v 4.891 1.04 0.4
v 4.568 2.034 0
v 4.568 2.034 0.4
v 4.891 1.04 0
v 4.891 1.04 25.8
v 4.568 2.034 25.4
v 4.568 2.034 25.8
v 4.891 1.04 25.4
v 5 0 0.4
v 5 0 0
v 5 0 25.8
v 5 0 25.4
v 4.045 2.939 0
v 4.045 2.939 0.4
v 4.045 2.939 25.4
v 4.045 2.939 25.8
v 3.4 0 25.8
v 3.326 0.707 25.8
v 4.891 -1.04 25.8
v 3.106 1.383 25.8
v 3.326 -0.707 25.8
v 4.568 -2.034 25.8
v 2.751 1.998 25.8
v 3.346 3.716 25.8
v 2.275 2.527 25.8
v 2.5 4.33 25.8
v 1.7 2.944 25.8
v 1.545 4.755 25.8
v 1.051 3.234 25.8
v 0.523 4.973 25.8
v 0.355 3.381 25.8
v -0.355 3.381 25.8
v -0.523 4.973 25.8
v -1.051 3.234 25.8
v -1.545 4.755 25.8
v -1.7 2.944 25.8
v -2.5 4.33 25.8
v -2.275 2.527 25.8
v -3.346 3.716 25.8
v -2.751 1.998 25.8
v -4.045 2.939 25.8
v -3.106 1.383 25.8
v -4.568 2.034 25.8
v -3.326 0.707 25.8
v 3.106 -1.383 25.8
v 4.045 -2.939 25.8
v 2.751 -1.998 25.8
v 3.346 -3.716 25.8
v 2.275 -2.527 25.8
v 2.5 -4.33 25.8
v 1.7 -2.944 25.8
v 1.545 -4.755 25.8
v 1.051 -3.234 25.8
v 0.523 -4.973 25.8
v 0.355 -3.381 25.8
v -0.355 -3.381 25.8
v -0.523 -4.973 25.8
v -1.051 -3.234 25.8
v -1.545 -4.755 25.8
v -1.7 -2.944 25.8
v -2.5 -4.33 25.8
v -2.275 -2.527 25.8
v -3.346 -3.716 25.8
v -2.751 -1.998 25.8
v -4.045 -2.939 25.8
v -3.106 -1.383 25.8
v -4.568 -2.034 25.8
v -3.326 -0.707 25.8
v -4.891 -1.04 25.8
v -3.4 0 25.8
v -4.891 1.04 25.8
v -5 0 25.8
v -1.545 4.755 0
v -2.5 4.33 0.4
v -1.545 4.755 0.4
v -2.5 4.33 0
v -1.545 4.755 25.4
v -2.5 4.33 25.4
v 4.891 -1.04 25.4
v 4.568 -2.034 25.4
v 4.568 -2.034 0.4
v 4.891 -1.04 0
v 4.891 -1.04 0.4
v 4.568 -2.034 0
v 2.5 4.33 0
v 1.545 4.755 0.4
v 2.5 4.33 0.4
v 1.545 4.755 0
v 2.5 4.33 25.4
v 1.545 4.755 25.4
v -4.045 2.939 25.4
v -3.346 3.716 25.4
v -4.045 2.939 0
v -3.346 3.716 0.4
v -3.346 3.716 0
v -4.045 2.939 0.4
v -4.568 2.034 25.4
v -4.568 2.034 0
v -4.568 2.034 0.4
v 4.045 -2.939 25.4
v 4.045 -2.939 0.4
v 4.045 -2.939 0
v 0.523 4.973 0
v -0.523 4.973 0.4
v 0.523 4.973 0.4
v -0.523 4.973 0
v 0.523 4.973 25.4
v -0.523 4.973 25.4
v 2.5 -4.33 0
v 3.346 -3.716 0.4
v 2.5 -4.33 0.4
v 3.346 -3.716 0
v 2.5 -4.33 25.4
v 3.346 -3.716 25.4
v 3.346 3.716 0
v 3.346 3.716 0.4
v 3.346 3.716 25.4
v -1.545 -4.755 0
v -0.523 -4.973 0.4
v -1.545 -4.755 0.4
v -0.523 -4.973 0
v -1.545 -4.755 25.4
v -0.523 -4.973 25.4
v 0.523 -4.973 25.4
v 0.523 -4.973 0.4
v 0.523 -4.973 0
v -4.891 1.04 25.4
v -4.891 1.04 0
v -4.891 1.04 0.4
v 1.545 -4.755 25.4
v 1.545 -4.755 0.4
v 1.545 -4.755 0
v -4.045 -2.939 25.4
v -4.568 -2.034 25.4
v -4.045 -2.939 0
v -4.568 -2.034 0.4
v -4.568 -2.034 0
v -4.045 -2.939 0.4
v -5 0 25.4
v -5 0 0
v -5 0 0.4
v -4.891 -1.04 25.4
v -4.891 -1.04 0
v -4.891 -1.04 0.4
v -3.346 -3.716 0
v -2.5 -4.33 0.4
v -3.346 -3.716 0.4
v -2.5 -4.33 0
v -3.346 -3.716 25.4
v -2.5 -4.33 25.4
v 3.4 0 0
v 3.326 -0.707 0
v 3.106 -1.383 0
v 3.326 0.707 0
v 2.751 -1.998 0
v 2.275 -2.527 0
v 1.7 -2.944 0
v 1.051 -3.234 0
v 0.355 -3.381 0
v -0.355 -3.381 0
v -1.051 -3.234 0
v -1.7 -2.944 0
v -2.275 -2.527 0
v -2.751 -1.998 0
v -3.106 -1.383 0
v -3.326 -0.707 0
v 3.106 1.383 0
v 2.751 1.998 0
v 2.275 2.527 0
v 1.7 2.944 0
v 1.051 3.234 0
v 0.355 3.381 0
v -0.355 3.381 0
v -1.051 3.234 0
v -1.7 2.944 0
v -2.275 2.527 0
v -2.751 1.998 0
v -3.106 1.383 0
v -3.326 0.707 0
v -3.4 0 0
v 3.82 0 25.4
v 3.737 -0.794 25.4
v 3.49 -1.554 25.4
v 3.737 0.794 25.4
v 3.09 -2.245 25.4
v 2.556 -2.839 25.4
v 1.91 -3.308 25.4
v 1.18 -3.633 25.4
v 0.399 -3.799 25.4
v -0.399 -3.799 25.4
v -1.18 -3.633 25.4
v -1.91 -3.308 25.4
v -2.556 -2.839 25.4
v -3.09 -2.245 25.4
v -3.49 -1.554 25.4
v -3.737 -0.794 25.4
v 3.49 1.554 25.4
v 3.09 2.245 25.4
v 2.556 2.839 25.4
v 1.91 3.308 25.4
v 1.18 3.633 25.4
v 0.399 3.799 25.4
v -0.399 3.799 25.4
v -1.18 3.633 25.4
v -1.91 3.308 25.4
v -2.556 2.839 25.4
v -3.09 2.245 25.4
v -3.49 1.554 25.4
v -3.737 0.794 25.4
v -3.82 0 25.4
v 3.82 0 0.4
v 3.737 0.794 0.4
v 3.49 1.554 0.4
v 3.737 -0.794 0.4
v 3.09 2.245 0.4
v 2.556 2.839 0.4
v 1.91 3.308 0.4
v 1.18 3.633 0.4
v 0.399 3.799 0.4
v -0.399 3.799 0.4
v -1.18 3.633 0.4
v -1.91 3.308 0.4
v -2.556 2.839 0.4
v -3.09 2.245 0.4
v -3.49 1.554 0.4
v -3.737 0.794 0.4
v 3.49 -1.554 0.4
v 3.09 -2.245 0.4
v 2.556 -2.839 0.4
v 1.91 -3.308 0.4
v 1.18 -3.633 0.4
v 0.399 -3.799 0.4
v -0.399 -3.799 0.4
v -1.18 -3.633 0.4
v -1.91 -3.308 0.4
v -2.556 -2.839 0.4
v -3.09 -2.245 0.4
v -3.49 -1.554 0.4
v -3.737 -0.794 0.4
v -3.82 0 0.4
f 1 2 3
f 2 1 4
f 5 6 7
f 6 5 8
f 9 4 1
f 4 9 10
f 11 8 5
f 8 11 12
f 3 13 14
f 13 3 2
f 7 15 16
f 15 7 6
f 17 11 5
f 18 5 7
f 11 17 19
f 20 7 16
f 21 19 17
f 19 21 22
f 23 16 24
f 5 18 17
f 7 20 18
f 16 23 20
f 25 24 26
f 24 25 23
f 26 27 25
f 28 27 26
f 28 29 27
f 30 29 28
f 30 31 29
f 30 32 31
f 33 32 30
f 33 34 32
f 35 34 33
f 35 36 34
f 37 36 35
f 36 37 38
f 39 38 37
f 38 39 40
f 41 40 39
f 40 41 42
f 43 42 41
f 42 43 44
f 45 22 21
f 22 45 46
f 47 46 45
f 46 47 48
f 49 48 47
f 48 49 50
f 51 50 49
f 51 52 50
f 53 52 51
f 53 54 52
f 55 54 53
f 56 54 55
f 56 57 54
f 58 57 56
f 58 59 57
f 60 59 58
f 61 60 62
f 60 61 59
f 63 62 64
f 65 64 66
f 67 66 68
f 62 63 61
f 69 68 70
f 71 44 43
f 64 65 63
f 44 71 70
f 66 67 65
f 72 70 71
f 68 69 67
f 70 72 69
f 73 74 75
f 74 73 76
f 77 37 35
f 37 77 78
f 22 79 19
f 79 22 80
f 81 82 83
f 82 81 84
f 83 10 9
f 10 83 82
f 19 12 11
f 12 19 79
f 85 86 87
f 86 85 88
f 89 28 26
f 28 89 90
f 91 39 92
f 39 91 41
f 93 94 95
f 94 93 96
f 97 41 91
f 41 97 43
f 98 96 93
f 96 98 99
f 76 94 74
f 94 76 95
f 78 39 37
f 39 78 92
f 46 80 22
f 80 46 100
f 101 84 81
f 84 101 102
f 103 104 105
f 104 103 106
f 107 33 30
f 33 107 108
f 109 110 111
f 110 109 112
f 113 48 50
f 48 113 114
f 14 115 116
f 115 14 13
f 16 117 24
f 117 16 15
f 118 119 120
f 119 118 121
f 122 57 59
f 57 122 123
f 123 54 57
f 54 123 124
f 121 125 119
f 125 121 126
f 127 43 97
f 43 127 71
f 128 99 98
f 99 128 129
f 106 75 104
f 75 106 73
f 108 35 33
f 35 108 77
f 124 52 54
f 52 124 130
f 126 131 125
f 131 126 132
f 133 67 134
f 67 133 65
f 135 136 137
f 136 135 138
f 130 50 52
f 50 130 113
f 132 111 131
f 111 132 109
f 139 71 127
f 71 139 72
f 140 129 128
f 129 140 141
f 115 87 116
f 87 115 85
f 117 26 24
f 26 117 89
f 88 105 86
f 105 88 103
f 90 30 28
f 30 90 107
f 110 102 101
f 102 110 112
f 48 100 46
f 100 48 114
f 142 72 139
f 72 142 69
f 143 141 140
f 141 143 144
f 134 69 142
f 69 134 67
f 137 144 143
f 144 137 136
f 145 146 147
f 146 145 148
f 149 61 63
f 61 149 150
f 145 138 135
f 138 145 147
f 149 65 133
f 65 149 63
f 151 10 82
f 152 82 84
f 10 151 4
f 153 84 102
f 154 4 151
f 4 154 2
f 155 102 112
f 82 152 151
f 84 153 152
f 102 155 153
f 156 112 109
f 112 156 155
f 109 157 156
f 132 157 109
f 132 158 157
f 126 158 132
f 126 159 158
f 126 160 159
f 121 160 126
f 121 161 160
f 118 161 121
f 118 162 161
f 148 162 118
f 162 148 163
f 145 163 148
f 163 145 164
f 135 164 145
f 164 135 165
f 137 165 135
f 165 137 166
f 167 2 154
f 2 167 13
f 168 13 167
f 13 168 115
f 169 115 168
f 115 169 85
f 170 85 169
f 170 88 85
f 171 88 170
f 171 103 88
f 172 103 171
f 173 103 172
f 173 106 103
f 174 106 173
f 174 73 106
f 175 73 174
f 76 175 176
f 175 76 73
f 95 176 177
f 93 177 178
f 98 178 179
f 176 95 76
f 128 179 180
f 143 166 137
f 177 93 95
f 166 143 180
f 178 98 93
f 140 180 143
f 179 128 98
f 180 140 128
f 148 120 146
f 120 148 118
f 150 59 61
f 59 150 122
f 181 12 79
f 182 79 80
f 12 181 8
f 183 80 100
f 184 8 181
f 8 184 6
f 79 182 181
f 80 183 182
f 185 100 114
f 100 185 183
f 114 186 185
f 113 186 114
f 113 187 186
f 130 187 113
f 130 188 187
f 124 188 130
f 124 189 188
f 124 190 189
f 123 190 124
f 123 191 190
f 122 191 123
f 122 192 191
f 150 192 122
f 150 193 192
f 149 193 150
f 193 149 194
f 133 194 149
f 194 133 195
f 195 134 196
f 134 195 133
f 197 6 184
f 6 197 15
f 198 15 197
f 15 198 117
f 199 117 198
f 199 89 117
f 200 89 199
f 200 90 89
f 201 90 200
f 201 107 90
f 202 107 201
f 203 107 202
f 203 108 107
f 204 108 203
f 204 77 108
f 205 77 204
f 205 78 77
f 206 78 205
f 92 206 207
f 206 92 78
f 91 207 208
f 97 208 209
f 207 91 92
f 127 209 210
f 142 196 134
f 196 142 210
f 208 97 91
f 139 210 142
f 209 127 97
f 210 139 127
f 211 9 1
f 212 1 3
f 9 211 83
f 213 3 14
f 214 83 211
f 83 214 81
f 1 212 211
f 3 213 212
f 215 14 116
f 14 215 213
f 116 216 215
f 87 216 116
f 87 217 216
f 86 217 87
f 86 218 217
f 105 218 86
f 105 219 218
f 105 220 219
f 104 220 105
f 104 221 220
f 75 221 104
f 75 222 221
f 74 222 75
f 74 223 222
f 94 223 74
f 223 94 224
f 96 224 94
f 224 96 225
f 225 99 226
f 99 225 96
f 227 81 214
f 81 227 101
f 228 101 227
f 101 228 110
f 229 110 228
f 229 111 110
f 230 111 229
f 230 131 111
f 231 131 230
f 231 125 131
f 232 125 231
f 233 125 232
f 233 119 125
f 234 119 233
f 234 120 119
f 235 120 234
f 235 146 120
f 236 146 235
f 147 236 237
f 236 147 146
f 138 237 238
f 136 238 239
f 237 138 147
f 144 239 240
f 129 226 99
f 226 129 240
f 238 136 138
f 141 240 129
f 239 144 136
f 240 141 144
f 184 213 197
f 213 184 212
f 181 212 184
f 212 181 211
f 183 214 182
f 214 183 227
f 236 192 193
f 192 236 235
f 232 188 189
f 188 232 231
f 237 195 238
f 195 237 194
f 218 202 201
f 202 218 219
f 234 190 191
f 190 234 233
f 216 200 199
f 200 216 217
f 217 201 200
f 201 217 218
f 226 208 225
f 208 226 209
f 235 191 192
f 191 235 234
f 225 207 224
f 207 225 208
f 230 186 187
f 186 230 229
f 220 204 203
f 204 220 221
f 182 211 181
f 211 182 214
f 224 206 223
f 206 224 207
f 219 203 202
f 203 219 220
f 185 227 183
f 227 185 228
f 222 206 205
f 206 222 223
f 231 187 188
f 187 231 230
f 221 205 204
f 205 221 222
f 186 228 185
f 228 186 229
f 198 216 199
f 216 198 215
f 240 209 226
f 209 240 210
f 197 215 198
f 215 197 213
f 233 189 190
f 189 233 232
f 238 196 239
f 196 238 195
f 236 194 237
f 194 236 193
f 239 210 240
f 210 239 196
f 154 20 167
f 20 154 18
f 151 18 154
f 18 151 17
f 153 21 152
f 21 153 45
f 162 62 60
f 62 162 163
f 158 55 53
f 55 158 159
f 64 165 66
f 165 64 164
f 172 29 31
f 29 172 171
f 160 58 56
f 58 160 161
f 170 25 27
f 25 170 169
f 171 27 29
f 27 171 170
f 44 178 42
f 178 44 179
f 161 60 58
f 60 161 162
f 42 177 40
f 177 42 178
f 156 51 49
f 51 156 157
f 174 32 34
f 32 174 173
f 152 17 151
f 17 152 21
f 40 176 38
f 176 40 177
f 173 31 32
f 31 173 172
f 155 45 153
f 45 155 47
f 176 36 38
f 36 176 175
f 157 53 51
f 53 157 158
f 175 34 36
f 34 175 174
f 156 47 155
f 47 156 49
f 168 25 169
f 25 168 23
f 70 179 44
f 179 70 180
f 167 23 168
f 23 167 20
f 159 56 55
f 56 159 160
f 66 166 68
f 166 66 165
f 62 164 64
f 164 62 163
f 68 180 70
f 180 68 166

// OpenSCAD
a = 25.8; // Overall length
b = 0.4; // flange thickness
c = 10.0; // flange diameter
d = 6.8; // ID of bobbin
e = 0.42; // Wall thickness

$fs=0.02;
translate ([0,0,a/2]) {
    // Center pillar
    difference() {
        union() {
            difference() {
                cylinder(a, r=c/2, center=true);
                cylinder(a-b*2, r=c/2, center=true);
                }
            cylinder(a, r=d/2 + e, center=true);
        }
        cylinder(a, r=d/2, center=true);
    }
}
